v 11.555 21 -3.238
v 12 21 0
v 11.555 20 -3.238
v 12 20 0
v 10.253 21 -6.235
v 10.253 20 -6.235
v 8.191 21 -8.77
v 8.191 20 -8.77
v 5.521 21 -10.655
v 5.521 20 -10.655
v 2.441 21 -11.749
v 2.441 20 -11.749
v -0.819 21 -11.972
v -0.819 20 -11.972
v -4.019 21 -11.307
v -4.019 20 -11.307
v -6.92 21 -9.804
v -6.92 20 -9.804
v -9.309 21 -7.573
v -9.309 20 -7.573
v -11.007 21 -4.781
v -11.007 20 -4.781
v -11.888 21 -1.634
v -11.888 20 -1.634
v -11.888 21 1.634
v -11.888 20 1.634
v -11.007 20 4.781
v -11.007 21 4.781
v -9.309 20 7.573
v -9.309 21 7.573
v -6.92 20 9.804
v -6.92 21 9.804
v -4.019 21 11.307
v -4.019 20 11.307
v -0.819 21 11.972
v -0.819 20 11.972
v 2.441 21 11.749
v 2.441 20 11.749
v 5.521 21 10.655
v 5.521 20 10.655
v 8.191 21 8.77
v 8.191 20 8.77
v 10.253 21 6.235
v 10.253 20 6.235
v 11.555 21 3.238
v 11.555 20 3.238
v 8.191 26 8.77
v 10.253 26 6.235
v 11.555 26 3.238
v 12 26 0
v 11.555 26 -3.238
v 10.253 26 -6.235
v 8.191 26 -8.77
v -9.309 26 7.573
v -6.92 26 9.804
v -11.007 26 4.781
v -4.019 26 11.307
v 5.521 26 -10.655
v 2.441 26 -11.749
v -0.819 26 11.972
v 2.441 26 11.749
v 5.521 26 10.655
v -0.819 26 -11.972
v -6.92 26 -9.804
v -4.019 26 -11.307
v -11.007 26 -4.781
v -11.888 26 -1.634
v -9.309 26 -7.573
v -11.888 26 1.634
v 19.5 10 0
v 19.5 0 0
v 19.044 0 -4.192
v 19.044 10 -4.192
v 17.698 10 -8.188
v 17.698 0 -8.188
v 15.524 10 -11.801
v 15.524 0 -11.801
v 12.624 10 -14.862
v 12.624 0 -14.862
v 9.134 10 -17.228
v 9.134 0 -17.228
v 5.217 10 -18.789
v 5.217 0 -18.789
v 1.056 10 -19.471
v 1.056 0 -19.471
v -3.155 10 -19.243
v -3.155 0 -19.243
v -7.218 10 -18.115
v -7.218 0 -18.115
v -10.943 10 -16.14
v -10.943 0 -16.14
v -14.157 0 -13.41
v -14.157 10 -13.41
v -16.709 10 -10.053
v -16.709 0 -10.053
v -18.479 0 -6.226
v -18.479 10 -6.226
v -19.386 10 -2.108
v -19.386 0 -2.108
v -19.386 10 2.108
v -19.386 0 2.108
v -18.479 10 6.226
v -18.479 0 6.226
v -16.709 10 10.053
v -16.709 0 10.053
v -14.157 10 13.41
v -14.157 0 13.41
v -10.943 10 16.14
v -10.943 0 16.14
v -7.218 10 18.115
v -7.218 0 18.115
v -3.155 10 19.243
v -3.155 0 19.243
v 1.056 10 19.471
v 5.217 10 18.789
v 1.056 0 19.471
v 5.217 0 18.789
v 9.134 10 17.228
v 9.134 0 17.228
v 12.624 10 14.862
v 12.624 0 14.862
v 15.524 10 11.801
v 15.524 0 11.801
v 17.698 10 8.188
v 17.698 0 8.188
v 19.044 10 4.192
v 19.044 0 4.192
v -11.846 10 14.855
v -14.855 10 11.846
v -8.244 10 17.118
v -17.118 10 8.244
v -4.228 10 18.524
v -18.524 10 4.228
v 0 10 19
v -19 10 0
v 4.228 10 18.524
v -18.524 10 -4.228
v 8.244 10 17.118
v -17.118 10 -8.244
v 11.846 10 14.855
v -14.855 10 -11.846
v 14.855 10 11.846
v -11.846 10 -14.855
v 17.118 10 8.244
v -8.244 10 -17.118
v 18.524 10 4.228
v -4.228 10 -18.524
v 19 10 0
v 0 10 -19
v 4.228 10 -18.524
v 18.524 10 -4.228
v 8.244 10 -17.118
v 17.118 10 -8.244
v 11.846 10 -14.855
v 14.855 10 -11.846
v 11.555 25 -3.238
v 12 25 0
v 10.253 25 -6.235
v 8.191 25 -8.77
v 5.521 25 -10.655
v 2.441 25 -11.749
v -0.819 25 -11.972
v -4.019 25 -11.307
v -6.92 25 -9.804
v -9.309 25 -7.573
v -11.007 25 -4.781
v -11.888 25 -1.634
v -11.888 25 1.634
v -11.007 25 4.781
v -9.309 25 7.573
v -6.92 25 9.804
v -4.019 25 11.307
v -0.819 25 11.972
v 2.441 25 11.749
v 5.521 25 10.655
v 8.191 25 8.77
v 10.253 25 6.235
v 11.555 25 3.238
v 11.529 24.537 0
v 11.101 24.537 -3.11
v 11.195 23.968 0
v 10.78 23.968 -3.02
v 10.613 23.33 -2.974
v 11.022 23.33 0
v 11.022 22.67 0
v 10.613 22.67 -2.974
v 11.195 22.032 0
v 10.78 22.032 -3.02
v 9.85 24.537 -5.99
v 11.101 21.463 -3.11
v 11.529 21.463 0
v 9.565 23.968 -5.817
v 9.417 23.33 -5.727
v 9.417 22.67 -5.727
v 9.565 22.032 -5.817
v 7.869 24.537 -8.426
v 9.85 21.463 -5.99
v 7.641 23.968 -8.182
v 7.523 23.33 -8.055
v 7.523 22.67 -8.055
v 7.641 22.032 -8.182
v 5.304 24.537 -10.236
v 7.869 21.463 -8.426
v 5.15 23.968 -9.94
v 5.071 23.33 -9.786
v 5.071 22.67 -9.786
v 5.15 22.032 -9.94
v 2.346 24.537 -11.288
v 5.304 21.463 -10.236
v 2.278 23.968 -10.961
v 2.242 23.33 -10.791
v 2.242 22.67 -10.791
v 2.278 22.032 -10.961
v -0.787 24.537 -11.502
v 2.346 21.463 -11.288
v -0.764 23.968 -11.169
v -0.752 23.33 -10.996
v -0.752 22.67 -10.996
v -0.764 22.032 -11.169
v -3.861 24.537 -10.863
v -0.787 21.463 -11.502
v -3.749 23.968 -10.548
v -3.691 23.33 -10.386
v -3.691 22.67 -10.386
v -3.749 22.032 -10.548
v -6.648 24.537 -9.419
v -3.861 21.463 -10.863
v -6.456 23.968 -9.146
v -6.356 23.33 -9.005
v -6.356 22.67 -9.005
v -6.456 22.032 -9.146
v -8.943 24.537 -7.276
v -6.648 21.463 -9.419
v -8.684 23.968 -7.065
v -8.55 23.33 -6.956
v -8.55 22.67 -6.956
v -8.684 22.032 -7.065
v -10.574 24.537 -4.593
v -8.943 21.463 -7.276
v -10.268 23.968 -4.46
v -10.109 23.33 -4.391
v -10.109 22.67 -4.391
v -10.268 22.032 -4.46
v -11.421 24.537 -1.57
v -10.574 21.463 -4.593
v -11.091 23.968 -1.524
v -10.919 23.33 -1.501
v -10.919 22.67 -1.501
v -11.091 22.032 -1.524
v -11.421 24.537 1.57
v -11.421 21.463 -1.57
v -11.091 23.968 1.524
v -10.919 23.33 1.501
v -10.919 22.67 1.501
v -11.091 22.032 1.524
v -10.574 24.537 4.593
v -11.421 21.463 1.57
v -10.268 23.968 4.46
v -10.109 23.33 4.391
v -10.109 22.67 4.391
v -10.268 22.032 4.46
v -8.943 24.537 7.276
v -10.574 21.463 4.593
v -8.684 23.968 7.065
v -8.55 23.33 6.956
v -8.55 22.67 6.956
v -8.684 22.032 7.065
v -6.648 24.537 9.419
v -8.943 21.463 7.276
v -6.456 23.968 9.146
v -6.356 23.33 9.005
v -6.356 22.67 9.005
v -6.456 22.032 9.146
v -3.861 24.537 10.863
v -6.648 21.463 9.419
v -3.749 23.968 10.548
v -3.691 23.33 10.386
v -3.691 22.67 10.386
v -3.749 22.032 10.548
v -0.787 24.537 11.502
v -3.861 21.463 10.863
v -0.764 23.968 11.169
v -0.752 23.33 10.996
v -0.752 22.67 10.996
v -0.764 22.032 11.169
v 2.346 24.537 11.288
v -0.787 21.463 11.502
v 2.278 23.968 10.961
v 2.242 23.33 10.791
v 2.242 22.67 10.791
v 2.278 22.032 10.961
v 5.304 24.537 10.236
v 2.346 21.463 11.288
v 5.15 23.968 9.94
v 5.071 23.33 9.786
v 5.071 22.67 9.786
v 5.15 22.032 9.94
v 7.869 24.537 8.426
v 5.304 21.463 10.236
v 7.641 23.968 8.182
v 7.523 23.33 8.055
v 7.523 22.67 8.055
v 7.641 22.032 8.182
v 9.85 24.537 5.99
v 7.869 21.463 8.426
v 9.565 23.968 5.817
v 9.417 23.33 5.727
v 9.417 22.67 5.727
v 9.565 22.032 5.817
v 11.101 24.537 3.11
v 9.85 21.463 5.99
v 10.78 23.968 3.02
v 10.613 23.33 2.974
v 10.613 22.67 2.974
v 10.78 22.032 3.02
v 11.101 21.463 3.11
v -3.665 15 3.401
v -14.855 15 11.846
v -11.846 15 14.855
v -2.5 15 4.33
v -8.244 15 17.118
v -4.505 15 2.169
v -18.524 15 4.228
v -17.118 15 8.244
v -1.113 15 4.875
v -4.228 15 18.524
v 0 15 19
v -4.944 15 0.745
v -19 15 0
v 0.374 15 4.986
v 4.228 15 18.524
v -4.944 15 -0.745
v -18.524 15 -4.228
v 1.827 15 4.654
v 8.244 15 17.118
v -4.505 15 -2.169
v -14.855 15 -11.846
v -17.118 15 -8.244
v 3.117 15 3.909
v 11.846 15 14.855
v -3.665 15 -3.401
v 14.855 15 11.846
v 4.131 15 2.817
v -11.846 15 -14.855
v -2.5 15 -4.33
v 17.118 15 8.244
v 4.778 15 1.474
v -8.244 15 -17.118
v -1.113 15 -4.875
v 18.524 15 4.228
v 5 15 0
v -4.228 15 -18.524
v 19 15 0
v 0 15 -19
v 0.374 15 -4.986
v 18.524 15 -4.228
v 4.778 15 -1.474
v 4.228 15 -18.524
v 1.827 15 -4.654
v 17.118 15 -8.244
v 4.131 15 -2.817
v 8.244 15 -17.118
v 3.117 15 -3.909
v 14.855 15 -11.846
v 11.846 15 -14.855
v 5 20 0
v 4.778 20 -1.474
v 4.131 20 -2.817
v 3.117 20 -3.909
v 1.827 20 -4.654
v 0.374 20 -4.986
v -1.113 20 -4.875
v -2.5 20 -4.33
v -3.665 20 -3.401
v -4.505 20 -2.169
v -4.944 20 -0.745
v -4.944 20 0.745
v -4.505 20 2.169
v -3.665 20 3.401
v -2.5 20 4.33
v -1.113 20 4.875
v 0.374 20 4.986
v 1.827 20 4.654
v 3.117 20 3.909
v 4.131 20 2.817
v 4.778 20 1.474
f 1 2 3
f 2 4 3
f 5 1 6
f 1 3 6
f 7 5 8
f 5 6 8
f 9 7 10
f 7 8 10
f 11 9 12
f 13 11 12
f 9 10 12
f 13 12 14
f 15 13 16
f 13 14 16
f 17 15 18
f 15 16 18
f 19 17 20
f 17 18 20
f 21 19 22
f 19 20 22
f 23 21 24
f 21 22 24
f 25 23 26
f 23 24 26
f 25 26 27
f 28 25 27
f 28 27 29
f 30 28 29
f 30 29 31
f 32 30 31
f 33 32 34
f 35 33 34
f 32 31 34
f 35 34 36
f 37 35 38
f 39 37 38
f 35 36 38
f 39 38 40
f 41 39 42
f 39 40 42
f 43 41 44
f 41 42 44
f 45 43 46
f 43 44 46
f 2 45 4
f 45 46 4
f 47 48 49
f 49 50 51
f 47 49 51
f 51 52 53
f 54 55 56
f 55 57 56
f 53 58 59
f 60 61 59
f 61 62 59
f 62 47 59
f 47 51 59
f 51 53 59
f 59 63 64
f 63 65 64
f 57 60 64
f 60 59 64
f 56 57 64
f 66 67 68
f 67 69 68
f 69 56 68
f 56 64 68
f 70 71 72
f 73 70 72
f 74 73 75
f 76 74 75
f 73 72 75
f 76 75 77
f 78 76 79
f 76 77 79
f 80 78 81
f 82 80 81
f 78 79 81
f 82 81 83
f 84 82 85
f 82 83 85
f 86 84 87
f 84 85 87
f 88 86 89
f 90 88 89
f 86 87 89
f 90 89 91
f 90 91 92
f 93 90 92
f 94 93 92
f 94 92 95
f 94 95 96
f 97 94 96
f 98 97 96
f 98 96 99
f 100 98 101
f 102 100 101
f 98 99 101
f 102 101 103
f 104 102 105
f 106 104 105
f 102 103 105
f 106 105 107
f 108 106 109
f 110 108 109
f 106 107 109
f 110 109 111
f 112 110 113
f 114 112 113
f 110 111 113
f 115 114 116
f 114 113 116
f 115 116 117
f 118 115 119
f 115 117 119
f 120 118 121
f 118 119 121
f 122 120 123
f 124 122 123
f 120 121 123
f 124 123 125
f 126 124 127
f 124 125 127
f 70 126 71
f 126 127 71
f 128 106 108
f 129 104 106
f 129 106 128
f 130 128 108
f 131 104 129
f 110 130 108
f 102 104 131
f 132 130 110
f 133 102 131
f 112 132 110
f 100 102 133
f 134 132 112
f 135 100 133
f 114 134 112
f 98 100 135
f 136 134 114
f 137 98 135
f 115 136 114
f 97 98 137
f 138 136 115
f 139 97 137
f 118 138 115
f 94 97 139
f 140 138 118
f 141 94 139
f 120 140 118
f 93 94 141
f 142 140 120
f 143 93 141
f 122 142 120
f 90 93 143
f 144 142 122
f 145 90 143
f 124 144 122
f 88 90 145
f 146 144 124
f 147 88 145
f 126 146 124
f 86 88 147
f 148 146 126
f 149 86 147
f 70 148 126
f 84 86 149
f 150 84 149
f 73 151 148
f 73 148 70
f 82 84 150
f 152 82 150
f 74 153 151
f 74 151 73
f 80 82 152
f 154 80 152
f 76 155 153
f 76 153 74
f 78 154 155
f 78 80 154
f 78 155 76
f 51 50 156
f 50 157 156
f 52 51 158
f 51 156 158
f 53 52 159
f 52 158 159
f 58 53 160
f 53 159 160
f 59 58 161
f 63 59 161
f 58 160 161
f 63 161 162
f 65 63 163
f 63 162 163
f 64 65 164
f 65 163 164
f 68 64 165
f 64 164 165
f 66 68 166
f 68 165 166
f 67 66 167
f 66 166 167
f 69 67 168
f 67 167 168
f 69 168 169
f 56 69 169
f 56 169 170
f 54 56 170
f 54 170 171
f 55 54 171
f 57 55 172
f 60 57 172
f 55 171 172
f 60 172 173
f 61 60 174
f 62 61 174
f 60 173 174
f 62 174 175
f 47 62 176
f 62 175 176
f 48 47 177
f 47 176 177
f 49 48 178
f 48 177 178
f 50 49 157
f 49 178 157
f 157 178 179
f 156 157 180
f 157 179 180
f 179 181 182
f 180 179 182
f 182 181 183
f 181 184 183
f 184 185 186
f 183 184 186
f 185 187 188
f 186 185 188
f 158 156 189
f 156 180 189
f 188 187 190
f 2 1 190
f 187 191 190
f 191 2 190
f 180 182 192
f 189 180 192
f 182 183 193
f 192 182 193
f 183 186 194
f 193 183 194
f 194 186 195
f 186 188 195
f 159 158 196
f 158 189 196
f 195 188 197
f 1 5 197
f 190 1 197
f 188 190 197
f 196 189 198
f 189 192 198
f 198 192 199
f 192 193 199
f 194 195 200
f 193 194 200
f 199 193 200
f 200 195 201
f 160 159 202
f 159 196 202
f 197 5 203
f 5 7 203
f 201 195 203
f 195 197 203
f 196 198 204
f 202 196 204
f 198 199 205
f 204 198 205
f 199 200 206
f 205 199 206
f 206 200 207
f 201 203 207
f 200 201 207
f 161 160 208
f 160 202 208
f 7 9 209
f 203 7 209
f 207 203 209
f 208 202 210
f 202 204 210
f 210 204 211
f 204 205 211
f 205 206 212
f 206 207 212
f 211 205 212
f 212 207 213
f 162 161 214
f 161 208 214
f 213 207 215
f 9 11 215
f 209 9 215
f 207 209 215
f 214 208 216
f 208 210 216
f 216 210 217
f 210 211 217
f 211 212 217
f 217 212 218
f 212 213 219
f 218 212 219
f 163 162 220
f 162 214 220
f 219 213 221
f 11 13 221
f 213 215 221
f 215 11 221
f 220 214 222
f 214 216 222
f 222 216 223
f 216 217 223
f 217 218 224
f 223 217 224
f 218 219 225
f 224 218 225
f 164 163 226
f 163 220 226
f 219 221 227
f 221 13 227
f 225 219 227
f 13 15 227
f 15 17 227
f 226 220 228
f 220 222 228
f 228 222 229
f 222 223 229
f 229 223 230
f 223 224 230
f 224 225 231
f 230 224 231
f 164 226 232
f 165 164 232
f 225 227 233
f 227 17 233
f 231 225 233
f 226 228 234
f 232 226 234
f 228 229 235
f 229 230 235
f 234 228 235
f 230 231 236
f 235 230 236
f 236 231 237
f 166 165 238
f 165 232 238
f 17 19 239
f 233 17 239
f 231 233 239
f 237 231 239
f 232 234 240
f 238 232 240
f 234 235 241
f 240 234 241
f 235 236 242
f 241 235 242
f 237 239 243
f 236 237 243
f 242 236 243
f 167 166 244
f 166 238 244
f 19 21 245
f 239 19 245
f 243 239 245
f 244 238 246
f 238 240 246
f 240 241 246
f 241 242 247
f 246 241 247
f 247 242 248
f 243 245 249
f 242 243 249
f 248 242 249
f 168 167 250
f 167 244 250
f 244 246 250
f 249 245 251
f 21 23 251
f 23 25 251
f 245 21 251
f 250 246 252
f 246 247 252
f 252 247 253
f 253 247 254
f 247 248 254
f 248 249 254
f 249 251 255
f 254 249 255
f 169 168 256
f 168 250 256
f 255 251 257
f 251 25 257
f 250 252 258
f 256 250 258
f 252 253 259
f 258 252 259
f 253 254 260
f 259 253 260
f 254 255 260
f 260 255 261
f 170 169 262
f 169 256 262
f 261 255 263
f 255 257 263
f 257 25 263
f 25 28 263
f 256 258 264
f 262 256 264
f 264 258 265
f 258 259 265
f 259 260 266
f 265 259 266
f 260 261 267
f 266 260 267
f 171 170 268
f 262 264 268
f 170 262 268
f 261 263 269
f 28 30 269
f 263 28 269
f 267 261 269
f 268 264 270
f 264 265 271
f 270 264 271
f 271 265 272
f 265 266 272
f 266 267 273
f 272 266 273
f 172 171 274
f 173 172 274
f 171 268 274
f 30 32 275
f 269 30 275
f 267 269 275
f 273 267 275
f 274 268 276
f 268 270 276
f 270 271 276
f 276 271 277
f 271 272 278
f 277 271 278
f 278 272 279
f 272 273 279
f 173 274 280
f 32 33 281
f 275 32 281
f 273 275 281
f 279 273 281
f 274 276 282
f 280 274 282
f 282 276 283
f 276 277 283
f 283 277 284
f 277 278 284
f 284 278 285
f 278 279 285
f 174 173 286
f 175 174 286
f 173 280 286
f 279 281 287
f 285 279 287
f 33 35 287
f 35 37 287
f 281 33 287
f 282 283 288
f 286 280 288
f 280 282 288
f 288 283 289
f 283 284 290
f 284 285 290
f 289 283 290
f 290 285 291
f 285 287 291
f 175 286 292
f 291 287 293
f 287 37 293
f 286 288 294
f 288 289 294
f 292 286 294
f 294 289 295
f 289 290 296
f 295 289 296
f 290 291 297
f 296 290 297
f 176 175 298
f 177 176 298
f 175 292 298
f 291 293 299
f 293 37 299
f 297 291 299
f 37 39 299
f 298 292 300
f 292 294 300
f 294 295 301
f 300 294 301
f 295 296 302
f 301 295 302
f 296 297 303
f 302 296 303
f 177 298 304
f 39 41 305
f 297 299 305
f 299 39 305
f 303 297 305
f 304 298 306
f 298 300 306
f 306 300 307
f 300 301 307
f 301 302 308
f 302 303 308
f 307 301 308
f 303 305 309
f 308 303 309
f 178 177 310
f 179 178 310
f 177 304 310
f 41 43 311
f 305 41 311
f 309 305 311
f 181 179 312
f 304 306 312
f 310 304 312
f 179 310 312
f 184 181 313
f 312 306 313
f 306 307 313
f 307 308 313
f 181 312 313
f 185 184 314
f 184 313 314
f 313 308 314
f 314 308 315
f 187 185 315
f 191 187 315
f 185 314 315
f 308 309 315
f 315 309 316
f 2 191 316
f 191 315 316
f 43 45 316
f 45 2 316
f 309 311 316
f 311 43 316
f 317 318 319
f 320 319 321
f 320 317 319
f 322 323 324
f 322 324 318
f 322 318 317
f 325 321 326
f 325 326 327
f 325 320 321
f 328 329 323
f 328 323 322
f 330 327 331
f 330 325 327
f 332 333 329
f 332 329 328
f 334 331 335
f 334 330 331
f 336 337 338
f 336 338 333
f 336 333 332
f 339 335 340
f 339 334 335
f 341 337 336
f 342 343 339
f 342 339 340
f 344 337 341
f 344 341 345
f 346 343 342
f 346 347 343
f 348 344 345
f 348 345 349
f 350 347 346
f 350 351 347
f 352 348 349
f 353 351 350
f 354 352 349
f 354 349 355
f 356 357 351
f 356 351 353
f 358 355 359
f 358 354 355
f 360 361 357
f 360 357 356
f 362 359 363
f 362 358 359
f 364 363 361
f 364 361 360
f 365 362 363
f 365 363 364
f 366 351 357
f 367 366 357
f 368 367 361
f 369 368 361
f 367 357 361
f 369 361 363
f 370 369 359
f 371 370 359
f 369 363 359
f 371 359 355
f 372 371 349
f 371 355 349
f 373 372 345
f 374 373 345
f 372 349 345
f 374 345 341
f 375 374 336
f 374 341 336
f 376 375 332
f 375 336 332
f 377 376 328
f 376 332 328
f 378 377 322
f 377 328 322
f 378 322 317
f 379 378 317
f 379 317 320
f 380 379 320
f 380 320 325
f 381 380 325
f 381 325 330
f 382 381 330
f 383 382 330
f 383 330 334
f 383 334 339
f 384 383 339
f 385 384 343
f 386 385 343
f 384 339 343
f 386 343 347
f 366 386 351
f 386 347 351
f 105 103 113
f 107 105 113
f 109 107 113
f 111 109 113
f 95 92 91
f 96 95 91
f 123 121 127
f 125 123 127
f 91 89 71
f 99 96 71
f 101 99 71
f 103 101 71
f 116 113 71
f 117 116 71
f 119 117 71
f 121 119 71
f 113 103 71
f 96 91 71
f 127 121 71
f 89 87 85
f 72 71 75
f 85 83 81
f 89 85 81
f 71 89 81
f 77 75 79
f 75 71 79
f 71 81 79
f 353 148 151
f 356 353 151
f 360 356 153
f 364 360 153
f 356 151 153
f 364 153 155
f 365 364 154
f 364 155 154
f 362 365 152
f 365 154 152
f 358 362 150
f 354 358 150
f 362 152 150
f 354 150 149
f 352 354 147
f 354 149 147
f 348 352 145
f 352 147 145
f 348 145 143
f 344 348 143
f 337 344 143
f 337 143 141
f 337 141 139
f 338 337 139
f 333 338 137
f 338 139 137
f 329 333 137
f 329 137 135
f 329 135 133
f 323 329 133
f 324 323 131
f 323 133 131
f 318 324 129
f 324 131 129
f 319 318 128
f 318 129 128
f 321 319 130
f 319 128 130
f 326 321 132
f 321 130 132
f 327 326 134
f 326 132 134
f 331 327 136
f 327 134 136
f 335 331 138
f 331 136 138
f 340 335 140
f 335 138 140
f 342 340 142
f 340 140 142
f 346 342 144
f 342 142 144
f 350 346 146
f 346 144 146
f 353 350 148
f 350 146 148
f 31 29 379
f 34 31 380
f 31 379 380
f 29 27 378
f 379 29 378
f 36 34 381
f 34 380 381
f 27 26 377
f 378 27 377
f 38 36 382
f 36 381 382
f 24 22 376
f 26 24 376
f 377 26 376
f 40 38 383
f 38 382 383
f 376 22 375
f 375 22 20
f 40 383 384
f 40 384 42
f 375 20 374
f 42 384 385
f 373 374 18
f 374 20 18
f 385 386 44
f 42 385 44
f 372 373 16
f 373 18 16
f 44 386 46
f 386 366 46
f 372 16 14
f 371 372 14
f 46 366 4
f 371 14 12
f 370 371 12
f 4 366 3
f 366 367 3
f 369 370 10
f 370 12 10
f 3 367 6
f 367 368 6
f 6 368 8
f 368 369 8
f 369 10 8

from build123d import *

# Parameters (mm, degrees)
SKETCH_1_R      = 19.5
EXTRUDE_1_DEPTH = 10
SKETCH_2_R      = 19
EXTRUDE_2_DEPTH = 5
SKETCH_3_R      = 5
EXTRUDE_3_DEPTH = 5


with BuildPart() as part:
    # 草图1 → 凸台-拉伸1 (new body)
    with BuildSketch(Plane(origin=(0, 0, 0), x_dir=(1, 0, 0), z_dir=(0, 1, 0))):
        Circle(SKETCH_1_R)
    extrude(amount=EXTRUDE_1_DEPTH)

    # 草图2 → 凸台-拉伸2 (add)
    with BuildSketch(Plane(origin=(0, 10, 0), x_dir=(1, 0, 0), z_dir=(0, 1, 0))):
        Circle(SKETCH_2_R)
    extrude(amount=EXTRUDE_2_DEPTH)

    # 草图3 → 凸台-拉伸3 (add)
    with BuildSketch(Plane(origin=(0, 15, 0), x_dir=(1, 0, 0), z_dir=(0, 1, 0))):
        Circle(SKETCH_3_R)
    extrude(amount=EXTRUDE_3_DEPTH)

    # 草图5 → 旋转1 (revolve)
    with BuildSketch(Plane.XY):
        with BuildLine():
            Line((0, 20), (0, 26))
            Line((0, 26), (12, 26))
            Line((12, 26), (12, 25))
            ThreePointArc((12, 25), (11, 23), (12, 21))
            Line((12, 21), (12, 20))
            Line((12, 20), (0, 20))
        make_face()
    revolve(axis=Axis((0, 20, 0), (0, 1, 0)))


solid = part.part
